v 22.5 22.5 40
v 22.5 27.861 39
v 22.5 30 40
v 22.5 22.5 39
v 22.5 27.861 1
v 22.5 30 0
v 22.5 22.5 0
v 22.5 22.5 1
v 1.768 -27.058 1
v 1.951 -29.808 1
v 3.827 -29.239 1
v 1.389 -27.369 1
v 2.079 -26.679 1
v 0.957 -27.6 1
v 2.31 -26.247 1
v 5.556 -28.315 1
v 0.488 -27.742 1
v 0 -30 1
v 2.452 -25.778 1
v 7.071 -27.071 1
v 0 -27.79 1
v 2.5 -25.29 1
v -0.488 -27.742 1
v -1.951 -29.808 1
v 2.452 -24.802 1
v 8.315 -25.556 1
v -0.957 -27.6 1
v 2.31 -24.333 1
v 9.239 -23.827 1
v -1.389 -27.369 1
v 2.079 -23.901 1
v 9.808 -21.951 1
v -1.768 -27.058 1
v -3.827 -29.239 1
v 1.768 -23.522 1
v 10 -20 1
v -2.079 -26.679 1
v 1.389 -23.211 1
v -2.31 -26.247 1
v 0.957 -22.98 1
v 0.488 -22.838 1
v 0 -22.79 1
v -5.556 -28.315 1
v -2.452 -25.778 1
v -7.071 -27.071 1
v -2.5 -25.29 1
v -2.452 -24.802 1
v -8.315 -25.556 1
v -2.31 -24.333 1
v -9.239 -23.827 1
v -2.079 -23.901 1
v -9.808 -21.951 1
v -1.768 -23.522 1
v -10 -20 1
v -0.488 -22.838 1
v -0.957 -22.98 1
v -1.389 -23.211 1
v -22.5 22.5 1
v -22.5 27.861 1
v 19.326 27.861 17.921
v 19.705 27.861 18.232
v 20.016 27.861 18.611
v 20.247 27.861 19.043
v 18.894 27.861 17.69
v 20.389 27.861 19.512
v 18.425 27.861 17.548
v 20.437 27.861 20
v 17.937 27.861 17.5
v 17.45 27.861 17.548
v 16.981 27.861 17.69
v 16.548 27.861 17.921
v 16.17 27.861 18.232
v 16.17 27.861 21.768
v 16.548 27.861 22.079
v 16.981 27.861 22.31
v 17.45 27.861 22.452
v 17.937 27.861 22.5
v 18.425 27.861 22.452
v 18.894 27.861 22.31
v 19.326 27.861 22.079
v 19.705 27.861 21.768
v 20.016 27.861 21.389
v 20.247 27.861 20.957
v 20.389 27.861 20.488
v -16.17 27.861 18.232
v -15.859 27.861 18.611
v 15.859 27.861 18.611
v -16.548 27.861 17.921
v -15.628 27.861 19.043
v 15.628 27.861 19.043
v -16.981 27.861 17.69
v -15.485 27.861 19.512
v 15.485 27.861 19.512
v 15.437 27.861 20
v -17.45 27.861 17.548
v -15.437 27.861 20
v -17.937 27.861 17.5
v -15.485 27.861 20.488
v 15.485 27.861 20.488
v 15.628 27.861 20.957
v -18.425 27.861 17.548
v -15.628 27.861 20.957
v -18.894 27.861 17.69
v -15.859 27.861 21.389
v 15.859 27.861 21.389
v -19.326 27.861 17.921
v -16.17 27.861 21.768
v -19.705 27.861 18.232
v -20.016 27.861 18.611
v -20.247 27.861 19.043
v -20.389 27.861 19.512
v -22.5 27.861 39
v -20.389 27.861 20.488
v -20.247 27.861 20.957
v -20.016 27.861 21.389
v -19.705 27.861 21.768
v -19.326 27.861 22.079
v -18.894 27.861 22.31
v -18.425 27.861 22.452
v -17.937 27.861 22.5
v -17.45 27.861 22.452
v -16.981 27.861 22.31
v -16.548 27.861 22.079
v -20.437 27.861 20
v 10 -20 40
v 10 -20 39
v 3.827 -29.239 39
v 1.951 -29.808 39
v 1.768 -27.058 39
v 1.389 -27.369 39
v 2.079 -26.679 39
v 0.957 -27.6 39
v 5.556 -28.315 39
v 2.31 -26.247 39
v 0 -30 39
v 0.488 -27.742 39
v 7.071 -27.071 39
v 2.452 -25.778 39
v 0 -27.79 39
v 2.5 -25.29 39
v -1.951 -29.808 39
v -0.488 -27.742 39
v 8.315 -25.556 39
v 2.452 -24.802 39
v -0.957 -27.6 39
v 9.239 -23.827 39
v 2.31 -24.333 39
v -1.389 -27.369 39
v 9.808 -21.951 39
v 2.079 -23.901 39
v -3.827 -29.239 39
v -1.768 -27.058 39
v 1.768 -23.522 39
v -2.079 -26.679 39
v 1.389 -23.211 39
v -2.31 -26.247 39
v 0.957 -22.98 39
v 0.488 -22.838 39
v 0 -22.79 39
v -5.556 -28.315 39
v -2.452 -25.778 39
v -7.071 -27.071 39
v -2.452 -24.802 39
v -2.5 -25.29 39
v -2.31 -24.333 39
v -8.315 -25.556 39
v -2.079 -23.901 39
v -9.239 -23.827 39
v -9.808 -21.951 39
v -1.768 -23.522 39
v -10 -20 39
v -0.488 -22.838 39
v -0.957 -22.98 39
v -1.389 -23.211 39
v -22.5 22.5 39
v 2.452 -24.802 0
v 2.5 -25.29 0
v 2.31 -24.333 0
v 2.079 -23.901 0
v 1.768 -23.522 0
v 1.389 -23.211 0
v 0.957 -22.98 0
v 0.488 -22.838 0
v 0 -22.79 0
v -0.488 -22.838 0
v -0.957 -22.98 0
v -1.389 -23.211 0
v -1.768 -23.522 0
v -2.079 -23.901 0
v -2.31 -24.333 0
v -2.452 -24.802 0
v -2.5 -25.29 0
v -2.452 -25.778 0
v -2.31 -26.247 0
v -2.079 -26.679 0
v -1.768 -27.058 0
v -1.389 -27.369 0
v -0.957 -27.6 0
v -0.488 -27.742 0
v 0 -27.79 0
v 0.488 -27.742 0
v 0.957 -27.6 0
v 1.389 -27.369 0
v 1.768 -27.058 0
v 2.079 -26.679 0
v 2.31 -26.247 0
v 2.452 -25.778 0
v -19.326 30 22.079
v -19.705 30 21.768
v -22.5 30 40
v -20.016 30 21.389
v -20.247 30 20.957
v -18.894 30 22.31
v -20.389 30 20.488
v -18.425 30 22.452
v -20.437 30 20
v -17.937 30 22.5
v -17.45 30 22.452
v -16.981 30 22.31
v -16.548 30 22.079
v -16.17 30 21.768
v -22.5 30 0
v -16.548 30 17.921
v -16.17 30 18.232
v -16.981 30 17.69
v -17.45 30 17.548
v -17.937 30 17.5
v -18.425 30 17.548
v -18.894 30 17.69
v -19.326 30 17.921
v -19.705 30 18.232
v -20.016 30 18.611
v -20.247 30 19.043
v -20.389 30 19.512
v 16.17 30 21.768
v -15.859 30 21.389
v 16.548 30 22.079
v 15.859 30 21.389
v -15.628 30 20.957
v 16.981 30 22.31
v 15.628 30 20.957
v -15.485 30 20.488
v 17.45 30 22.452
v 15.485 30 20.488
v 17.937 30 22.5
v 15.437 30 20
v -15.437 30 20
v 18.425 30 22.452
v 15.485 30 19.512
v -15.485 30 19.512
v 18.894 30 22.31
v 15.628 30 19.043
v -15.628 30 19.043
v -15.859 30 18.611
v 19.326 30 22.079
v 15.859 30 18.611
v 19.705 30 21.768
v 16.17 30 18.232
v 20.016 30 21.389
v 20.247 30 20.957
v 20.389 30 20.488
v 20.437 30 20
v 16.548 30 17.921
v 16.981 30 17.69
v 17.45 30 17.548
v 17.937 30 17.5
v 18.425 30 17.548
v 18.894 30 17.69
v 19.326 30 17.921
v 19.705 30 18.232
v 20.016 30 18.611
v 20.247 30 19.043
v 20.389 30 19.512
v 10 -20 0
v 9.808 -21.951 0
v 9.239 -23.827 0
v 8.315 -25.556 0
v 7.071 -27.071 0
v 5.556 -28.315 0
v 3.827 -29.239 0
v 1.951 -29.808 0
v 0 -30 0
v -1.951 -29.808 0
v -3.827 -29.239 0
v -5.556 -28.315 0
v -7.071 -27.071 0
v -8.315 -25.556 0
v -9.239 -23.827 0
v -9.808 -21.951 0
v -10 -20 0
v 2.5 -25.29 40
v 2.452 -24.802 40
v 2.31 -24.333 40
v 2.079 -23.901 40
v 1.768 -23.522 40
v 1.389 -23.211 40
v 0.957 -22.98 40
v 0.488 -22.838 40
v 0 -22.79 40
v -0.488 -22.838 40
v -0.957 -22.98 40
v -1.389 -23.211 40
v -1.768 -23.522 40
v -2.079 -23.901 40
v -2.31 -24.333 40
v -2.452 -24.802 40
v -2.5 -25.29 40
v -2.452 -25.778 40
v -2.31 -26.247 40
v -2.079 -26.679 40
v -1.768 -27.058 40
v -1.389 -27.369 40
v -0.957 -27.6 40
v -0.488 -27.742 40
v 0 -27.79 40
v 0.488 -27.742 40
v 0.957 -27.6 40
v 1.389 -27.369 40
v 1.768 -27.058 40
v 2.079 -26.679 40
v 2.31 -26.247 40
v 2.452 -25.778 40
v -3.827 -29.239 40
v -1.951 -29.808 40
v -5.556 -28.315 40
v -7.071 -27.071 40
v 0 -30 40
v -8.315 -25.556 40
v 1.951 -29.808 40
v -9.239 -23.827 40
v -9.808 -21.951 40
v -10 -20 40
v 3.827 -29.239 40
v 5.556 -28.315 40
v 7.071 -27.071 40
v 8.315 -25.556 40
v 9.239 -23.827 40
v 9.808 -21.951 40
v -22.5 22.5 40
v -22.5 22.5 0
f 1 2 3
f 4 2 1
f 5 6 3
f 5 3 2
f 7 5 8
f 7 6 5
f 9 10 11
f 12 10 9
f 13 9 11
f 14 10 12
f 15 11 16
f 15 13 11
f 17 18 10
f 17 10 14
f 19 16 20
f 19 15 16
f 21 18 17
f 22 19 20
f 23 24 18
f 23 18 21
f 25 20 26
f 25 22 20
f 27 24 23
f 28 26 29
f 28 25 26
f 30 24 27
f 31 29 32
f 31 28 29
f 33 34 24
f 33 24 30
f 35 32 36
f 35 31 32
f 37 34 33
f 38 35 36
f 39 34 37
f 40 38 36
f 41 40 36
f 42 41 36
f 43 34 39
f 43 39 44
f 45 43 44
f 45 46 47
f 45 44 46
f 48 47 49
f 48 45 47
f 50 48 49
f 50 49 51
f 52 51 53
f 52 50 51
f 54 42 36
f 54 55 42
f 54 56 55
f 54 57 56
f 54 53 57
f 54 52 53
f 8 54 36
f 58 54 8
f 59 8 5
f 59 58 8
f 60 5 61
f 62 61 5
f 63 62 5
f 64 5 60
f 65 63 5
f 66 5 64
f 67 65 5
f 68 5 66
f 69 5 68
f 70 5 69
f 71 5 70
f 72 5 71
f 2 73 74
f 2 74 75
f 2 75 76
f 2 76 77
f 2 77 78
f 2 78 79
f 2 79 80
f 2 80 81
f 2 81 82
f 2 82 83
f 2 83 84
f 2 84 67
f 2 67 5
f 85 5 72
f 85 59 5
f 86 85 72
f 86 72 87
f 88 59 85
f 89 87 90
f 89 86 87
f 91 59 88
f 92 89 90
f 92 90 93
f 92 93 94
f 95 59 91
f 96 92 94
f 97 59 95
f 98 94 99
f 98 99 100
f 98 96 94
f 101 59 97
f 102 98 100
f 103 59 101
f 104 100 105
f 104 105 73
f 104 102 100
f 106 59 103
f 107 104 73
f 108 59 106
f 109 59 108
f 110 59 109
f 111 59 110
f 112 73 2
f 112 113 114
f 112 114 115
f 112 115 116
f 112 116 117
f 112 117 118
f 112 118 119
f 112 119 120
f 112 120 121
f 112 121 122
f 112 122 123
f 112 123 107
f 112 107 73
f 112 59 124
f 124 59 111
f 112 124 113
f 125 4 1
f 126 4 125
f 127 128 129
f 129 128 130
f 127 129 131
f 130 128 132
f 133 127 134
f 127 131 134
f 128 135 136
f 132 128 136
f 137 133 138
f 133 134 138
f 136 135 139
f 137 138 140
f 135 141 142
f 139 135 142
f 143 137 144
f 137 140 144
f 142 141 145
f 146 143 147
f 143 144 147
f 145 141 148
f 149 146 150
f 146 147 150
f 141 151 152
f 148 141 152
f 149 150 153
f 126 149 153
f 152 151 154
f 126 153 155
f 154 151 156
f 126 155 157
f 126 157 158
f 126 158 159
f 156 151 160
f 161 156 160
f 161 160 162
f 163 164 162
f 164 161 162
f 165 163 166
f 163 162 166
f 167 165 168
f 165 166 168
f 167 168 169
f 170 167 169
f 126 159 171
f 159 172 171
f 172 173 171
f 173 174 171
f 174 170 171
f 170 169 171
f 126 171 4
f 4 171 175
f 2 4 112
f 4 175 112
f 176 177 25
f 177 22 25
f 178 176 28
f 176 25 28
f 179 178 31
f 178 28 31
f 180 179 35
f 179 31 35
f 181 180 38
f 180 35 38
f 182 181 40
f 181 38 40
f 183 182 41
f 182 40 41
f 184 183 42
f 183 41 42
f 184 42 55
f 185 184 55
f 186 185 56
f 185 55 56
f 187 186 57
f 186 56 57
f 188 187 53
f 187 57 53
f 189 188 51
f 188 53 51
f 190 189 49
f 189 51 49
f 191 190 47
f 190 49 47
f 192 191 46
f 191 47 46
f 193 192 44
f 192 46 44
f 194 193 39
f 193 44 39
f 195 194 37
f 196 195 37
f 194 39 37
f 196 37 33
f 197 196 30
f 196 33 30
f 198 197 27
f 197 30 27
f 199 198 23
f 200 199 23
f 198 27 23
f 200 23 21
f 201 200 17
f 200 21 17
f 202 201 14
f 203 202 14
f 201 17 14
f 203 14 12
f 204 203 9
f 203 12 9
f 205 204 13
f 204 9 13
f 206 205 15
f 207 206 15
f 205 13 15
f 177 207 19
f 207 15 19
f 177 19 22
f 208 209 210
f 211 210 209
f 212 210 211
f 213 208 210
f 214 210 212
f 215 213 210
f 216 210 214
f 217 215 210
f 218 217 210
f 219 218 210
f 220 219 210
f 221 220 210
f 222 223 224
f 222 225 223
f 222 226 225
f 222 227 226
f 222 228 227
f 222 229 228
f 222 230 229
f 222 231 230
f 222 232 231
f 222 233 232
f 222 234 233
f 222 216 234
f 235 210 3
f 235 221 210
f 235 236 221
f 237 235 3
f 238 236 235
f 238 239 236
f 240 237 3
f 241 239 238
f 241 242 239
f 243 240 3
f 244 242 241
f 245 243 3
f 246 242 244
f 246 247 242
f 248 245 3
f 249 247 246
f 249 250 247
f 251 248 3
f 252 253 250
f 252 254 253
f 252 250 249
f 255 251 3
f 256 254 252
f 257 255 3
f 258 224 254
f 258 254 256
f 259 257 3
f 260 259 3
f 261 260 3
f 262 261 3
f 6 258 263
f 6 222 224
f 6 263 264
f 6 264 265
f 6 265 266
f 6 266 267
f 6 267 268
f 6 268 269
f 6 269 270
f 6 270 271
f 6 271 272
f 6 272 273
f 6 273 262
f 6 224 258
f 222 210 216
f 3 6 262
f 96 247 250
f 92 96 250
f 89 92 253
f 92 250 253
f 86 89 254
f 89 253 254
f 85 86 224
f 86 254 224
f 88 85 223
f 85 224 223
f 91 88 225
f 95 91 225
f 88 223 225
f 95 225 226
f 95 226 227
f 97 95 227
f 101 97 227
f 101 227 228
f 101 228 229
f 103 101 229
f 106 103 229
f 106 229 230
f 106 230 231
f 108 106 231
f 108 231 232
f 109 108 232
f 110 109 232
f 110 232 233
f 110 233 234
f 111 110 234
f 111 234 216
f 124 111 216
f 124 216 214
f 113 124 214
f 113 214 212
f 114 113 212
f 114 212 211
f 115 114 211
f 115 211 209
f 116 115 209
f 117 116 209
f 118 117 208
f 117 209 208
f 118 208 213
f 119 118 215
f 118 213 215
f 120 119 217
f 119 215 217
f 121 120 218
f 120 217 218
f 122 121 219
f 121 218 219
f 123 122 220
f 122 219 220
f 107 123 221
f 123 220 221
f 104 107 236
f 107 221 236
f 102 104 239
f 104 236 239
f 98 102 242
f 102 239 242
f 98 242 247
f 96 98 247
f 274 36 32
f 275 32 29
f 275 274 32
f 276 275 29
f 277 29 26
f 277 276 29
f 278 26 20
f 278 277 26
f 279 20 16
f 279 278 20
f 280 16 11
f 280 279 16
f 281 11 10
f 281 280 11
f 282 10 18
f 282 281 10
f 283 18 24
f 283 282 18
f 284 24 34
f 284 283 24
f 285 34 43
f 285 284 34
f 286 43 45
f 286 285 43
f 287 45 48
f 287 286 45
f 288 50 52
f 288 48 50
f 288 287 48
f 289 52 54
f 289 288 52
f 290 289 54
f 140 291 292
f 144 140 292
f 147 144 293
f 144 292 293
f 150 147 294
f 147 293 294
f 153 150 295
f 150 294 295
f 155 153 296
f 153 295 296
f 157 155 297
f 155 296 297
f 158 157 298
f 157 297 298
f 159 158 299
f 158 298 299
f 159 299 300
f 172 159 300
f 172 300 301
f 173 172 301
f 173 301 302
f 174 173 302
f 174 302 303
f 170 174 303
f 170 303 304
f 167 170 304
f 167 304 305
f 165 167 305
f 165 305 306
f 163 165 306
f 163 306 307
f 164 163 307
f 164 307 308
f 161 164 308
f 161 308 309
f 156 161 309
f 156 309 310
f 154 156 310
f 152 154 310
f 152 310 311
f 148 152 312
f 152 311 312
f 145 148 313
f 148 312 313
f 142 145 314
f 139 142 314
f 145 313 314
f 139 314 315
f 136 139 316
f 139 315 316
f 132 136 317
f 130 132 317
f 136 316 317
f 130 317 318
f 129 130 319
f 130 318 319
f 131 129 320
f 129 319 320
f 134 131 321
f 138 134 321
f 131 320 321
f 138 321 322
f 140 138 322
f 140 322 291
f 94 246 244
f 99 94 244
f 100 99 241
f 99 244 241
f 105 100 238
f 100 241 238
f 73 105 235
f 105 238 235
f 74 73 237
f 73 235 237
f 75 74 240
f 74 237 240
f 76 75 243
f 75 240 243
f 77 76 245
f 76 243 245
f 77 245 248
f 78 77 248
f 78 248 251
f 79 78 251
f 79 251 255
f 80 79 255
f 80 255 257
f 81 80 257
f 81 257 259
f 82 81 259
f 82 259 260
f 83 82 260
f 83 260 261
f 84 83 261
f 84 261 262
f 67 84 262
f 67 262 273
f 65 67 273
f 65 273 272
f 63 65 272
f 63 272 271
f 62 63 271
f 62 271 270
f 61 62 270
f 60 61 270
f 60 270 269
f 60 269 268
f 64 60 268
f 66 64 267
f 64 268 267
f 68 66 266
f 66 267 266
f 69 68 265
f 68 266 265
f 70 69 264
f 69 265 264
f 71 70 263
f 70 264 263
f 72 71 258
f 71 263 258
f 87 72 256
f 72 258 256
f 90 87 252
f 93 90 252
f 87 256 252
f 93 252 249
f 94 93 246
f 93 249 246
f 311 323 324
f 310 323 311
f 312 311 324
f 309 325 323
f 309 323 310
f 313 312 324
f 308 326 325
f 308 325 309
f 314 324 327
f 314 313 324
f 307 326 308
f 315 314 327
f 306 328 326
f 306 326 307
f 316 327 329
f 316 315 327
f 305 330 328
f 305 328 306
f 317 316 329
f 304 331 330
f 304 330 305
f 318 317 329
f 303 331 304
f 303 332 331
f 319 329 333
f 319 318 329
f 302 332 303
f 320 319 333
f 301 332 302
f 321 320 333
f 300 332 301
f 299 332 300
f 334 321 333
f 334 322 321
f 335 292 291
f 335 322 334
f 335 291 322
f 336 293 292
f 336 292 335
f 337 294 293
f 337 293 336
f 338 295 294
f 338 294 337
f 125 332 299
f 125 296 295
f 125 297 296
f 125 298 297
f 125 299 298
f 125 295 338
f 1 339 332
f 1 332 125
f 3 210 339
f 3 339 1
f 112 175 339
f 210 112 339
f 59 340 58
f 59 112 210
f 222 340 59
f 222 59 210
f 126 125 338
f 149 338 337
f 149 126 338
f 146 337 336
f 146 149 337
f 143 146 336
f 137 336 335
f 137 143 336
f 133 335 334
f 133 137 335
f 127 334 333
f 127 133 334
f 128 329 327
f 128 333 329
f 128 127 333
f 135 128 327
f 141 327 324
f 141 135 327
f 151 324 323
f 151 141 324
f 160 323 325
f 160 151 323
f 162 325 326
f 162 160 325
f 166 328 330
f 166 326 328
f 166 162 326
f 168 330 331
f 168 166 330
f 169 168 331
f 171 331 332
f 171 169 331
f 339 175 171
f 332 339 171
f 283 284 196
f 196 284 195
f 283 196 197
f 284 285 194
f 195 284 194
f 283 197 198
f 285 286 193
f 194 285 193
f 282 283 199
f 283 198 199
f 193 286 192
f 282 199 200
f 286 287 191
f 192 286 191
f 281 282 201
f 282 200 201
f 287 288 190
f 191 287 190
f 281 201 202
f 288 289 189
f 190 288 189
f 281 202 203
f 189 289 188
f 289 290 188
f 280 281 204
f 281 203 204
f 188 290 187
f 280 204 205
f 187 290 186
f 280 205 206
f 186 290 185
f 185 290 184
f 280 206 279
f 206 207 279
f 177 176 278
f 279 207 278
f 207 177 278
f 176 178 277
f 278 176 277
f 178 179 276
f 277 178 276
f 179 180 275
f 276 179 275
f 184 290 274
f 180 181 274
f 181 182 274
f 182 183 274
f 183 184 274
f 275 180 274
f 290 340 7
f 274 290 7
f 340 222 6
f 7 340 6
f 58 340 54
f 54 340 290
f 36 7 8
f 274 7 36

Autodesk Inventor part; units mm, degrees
ref_plane "YZ Plane" through (0, 0, 0) normal (1, 0, 0) x (0, 1, 0)
ref_plane "XZ Plane" through (0, 0, 0) normal (0, 1, 0) x (-1, 0, 0)
ref_plane "XY Plane" through (0, 0, 0) normal (0, 0, 1) x (1, 0, 0)
sketch "Sketch1" plane through (0, 0, 0) normal (0, 0, 1) x (1, 0, 0)
  line L0 (-22.5, -30) -> (-22.5, 30)
  line L1 (-22.5, 30) -> (22.5, 30)
  line L2 (22.5, 30) -> (22.5, -30)
  line L3 (22.5, -30) -> (-22.5, -30)
  line L4 (-22.5, -30) -> (22.5, 30) construction
  line L5 (-22.5, 30) -> (22.5, -30) construction
  line L6 (-22.5, 30) -> (-22.5, 22.5)
  line L7 (0, -30) -> (0, -20)
  line L8 (0, -20) -> (-10, -20)
  line L9 (-10, -20) -> (10, -20)
  line L10 (-22.5, 22.5) -> (-10, -20)
  line L11 (22.5, 30) -> (22.5, 22.5)
  line L12 (22.5, 22.5) -> (10, -20)
  arc A0 (-10, -20) -> (10, -20) centre (0, -20) ccw
  point P0 (0, 0)
  dimension "d0" = 60
  dimension "d1" = 45
  dimension "d2" = 7.5
  dimension "d3" = 10
  dimension "d4" = 10
  dimension "d5" = 20
  dimension "d6" = 7.5
extrude "Extrusion1" add sketch "Sketch1" along normal blind 40 contours L0 L1 L2 L12 L9 L8 L10 | A0 L8 L7 | L7 L9 A0
sketch "Sketch2" plane through (0, 0, 0) normal (1, 0, 0) x (0, 1, 0)
  line L0 (30, 0) -> (30, 40) projected
  line L1 (30, 40) -> (30, 0)
  line L2 (-20, 0) -> (-30, 0) projected
  line L3 (30, 0) -> (-30, 0)
  line L4 (-30, 0) -> (-30, 1)
  line L5 (-30, 0) -> (-30, 40) projected
  line L6 (30, 40) -> (-30, 40)
  line L7 (-30, 40) -> (-30, 39)
  line L8 (-30, 39) -> (27.8612, 39)
  line L9 (30, 40) -> (22.5, 40) projected
  line L10 (-30, 1) -> (27.8612, 1)
  line L11 (27.8612, 1) -> (27.8612, 39)
  line L12 (-30, 39) -> (-30, 1)
  point P0 (0, 0)
  dimension "d9" = 1
  dimension "d10" = 1
extrude "Extrusion2" cut sketch "Sketch2" along normal through all both and the other way through all contours L5 L8 L11 L10
sketch "Sketch3" plane through (0, 0, 40) normal (0, 0, 1) x (1, 0, 0)
  arc A0 (-10, -20) -> (10, -20) centre (0, -20) ccw projected
  line L0 (10, -20) -> (22.5, 22.5) projected
  line L1 (22.5, 22.5) -> (22.5, 30) projected
  line L2 (22.5, 30) -> (-22.5, 30) projected
  line L3 (-22.5, 30) -> (-22.5, 22.5) projected
  line L4 (-22.5, 22.5) -> (-10, -20) projected
  circle A1 centre (0, -25.2901) radius 2.5
  point P0 (0, 0)
  dimension "d13" = 5
extrude "Extrusion3" cut sketch "Sketch3" against normal blind 40 contours A1
sketch "Sketch4" plane through (-22.5, 30, 0) normal (0, 1, 0) x (1, 0, 0)
  line L0 (45, -40) -> (0, -40) projected
  line L1 (45, 0) -> (0, 0) projected
  line L2 (0, -40) -> (45, 0) construction
  line L3 (0, 0) -> (0, -40) projected
  line L4 (0, 0) -> (45, -40) construction
  line L5 (0, -20) -> (45, -20) construction
  circle A0 centre (4.5627, -20) radius 2.5
  point P0 (22.5, 0)
  dimension "d16" = 5
extrude "Extrusion4" cut sketch "Sketch4" against normal blind 10
ref_plane "Work Plane1" through (0, 22.5, 0) normal (1, 0, 0) x (0, 0, -1)
mirror "Mirror1" about plane through (0, 22.5, 0) normal (1, 0, 0) of "Extrusion4"
properties part number "Thin Wheel Mount"
